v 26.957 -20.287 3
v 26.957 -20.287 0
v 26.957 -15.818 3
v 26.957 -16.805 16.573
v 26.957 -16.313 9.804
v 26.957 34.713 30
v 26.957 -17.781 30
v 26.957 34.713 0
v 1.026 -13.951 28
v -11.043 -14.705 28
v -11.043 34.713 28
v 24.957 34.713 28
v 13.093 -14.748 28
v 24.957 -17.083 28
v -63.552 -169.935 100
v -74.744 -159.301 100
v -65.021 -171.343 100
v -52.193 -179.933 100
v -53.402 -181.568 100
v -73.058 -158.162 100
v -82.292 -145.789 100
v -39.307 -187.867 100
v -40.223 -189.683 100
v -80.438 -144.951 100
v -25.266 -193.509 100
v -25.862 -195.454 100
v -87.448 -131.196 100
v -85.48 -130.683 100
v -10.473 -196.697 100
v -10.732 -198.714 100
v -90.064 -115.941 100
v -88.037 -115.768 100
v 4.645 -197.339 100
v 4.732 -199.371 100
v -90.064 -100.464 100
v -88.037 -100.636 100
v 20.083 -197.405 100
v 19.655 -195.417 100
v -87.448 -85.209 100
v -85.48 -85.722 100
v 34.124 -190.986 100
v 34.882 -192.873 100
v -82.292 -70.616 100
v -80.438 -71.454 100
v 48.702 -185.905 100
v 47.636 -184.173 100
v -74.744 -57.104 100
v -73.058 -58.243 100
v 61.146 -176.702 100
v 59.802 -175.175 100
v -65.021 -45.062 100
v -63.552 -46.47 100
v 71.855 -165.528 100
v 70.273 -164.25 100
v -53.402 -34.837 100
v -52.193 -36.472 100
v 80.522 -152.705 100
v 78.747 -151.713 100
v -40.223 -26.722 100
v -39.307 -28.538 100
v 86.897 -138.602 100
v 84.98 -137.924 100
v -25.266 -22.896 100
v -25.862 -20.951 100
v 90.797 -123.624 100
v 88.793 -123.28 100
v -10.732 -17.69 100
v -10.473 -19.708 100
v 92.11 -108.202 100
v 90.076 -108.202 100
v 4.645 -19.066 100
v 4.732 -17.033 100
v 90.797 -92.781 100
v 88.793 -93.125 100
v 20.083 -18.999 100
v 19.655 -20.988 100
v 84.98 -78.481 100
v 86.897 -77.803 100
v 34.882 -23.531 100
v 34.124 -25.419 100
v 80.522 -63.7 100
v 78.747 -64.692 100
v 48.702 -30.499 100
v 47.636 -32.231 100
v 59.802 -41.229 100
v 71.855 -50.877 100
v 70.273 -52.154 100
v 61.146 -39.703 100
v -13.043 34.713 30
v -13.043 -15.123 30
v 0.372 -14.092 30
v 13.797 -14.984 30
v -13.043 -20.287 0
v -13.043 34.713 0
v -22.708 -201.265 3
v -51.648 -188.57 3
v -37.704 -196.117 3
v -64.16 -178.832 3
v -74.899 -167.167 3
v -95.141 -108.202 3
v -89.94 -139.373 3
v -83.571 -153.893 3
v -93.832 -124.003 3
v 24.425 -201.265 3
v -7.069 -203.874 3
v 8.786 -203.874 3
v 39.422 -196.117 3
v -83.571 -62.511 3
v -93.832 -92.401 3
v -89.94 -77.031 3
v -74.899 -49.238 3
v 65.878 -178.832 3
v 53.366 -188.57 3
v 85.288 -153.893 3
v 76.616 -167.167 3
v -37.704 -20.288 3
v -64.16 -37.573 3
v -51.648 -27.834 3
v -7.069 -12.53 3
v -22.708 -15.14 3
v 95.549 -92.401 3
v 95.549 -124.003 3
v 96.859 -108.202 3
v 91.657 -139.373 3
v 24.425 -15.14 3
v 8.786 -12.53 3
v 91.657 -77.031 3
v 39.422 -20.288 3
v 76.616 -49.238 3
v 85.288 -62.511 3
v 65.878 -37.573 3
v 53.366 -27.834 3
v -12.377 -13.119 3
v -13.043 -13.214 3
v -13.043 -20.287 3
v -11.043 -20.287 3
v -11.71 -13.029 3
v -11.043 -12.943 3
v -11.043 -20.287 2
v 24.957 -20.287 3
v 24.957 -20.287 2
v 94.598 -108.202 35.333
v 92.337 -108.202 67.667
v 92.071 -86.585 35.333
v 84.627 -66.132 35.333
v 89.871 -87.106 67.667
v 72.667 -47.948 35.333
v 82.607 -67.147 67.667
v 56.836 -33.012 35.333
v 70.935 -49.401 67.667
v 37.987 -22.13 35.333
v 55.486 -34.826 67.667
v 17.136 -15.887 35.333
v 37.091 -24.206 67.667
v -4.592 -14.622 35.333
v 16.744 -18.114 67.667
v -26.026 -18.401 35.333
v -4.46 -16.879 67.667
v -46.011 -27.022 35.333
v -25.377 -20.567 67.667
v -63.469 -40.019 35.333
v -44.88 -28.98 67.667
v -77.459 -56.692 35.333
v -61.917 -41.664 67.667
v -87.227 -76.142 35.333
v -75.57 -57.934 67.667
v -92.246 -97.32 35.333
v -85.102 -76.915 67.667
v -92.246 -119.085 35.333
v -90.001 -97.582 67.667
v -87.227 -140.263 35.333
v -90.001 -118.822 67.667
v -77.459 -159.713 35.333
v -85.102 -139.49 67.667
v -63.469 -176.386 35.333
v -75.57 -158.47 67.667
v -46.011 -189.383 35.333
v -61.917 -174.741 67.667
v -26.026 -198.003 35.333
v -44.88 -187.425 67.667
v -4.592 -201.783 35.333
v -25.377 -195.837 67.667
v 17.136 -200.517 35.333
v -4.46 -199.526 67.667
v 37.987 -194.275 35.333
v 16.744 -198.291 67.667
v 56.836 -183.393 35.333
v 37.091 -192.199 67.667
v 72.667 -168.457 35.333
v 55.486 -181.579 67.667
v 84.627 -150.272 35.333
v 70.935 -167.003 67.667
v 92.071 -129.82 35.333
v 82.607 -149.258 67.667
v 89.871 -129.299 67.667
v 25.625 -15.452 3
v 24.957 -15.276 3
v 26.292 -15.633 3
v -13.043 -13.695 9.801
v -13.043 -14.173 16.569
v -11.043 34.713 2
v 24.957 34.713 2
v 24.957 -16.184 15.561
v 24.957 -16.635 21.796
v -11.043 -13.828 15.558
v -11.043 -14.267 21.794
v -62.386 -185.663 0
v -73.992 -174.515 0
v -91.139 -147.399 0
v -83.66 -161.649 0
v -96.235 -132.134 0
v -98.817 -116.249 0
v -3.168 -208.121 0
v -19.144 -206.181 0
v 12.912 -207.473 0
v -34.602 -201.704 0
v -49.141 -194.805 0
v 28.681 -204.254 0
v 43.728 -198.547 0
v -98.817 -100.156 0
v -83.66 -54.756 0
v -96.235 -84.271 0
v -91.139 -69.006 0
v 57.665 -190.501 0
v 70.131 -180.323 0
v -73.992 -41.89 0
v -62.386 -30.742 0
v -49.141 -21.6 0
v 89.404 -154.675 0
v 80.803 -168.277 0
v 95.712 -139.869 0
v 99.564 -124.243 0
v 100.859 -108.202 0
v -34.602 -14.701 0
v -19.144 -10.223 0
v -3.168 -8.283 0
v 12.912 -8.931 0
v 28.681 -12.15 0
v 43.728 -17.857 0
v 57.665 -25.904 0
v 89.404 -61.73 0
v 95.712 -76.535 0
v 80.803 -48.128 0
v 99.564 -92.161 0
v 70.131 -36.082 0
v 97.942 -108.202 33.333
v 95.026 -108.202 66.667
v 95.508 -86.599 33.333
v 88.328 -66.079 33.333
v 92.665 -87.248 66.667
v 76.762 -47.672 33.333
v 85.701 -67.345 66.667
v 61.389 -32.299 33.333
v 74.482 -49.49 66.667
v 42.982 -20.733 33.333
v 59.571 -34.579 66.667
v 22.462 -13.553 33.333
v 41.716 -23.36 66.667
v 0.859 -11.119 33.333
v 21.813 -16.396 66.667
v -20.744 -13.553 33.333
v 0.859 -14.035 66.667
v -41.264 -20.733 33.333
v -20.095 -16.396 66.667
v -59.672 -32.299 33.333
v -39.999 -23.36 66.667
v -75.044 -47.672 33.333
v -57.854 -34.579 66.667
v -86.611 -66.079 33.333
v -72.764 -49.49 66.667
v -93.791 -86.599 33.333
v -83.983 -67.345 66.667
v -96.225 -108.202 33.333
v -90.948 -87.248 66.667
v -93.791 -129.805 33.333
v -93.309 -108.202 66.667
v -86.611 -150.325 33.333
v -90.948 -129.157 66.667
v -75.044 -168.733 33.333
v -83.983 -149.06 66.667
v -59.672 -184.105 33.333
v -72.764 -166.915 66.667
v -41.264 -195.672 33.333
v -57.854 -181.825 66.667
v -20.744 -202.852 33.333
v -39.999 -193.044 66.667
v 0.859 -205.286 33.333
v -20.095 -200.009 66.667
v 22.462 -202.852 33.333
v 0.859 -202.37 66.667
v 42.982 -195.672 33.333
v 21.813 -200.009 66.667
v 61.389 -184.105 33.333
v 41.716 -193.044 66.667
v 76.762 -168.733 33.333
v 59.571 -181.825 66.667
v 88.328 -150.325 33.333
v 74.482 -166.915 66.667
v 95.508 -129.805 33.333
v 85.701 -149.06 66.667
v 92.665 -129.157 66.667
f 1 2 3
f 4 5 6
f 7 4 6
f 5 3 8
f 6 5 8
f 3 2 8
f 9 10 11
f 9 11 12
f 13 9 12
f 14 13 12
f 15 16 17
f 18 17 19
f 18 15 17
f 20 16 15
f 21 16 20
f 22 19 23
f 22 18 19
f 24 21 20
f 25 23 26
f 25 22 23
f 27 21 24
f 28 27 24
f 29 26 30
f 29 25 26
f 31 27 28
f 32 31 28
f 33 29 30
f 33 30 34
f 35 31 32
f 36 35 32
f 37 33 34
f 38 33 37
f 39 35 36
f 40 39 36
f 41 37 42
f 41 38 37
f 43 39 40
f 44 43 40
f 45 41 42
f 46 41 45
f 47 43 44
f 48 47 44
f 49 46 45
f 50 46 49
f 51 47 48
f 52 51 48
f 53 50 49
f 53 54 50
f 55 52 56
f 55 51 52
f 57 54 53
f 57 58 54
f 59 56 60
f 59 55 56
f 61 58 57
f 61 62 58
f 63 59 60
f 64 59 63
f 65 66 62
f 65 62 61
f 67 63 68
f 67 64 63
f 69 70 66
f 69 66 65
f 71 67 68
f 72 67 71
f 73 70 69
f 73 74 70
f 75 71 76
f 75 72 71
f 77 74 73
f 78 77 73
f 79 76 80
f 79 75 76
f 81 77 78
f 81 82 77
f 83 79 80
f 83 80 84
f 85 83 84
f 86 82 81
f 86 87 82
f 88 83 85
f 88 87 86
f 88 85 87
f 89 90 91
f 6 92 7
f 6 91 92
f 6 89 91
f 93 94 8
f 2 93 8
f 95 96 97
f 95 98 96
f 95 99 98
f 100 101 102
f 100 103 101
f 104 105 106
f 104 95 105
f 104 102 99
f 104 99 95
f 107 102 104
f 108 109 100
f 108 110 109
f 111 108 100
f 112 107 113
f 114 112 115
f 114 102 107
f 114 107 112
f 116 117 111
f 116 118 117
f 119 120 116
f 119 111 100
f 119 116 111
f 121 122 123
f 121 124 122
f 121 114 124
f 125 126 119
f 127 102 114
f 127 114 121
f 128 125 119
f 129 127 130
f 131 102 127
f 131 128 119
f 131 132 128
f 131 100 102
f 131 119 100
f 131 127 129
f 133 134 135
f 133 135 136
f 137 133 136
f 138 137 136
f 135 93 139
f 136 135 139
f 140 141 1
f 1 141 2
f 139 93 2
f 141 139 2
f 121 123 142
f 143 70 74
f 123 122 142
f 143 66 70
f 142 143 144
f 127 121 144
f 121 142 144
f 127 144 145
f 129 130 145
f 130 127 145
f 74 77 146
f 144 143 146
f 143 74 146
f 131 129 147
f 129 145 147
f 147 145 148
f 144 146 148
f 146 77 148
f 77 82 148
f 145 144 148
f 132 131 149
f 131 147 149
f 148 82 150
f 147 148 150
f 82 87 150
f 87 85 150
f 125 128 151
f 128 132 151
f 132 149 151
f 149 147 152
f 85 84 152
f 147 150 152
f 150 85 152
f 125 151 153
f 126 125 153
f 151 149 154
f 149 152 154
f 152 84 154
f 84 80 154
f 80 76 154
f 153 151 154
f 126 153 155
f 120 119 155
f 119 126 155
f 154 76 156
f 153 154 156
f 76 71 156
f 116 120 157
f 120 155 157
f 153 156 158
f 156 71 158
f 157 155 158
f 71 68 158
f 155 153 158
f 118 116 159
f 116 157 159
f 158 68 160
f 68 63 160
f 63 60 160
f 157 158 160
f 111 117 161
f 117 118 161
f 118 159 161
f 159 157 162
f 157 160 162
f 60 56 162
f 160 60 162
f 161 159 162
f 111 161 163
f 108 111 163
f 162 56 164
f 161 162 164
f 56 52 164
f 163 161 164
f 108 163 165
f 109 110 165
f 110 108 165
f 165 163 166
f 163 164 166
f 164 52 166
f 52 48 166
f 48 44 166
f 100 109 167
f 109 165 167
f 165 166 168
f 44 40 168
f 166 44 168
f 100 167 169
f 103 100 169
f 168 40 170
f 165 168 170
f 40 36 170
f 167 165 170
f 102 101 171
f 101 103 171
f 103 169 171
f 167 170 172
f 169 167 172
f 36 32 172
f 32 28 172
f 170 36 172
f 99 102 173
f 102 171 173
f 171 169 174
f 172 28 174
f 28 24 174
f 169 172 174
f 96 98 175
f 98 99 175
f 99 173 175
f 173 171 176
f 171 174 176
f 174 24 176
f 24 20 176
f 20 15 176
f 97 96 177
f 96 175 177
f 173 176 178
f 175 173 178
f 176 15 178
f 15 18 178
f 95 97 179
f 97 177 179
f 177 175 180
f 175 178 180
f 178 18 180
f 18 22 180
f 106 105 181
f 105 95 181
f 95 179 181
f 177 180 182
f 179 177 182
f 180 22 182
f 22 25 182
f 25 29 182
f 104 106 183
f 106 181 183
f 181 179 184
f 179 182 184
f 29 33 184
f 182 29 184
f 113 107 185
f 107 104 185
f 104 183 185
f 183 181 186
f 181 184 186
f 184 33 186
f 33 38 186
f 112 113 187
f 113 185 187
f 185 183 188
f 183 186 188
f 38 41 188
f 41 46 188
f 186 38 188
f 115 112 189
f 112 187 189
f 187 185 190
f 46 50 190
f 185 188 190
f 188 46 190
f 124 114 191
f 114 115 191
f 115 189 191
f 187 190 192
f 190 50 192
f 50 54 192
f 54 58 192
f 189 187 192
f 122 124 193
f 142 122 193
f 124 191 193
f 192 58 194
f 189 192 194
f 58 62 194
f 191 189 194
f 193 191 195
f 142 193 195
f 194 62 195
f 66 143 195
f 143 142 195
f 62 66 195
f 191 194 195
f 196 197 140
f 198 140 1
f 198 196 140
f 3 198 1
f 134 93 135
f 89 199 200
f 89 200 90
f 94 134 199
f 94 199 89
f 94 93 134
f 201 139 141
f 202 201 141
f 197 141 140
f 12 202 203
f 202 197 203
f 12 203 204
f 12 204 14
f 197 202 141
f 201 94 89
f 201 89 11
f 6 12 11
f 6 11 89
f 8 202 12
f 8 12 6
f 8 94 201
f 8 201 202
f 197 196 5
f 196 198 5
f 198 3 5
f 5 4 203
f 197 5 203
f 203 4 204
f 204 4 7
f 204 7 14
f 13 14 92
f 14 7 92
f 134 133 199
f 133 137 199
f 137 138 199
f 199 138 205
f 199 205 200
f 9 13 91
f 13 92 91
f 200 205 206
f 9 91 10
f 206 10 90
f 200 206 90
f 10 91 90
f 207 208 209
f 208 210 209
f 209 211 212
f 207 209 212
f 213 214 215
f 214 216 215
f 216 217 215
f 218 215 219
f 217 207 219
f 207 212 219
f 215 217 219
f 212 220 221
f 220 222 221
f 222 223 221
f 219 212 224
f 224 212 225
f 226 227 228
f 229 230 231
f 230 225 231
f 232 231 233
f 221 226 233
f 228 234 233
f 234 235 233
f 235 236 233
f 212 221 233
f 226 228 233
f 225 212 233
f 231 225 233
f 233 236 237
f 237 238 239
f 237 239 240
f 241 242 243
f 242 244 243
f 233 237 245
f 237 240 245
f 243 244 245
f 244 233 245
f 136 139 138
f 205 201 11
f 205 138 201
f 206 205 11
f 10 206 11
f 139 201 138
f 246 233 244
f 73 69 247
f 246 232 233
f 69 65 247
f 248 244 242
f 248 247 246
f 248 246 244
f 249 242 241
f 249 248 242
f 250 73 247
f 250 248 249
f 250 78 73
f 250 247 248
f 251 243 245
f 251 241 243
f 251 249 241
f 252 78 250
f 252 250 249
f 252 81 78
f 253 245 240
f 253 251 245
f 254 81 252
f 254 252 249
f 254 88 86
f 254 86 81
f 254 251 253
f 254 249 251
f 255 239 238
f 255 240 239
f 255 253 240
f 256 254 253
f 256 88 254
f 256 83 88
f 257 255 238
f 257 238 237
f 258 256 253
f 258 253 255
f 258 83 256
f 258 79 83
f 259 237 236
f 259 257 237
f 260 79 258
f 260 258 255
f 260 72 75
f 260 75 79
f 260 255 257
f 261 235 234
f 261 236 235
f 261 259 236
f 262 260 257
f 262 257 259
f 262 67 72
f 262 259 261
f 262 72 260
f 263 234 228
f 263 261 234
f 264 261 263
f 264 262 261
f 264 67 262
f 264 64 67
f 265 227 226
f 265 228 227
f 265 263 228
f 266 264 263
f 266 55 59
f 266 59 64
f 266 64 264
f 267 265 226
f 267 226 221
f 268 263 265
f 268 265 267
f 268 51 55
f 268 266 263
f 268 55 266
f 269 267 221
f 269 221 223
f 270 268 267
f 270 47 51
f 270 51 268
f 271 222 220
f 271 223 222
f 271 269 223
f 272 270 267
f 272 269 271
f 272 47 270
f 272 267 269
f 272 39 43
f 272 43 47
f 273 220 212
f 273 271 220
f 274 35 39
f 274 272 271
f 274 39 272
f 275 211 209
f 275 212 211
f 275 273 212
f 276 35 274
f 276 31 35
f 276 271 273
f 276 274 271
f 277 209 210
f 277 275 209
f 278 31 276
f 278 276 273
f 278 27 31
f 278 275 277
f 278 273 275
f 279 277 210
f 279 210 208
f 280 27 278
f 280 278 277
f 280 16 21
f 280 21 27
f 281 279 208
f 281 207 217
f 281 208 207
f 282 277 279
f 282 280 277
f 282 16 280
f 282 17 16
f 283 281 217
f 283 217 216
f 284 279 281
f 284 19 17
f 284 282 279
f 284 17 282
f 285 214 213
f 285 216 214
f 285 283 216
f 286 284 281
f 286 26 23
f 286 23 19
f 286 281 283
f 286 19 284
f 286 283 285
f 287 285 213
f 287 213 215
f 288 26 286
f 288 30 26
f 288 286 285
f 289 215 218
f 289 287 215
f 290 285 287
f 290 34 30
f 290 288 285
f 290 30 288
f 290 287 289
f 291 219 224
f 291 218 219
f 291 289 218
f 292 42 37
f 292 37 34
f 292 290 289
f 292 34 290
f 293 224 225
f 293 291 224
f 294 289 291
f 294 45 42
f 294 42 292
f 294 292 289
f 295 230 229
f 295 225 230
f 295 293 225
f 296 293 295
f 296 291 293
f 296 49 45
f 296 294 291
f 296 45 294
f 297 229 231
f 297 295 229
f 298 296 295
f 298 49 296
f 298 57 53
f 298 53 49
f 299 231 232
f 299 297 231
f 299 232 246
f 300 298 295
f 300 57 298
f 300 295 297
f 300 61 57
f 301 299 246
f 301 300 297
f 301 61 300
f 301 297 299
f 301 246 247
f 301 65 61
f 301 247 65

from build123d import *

# Parameters (mm, degrees)
F0_W          = 40
F0_H          = 55
F1_DEPTH      = 30
F2_W          = 36
F2_H          = 26
F3_DEPTH      = 189.1
F3_DEPTH_BACK = 48.4
F4_R          = 100
F5_DEPTH      = 100
F5_TAPER      = 5
F8_R          = 96
F9_DEPTH      = 100
F9_TAPER      = 4


with BuildPart() as f1:
    # F0 (on Top) → F1 (new body)
    with BuildSketch(Plane.XY):
        with Locations((6.9573908113, 20.1134101001)):
            Rectangle(F0_W, F0_H)
    extrude(amount=F1_DEPTH)

    # F2 (on face) → F3 (cut, two sides)
    with BuildSketch(Plane.XZ.offset(7.3865898999)) as f3_sk:
        with Locations((6.9573908113, 15)):
            Rectangle(F2_W, F2_H)
    extrude(amount=-F3_DEPTH, mode=Mode.SUBTRACT)
    extrude(f3_sk.sketch, amount=F3_DEPTH_BACK, mode=Mode.SUBTRACT)


with BuildPart() as f5:
    # F4 (on Top) → F5 (new body)
    with BuildSketch(Plane.XY):
        with Locations((0.8587710145, -108.2022971908)):
            Circle(F4_R)
    extrude(amount=F5_DEPTH, taper=F5_TAPER)


with BuildPart() as f1_1:
    # F6: moved
    add(f1.part.moved(Location((0, -12.9, 0))))


with BuildPart() as f9_tool:
    # F8 (on offset) → F9 (new body)
    with BuildSketch(Plane.XY.offset(3)):
        with Locations((0.8587710145, -108.2022971908)):
            Circle(F8_R)
    extrude(amount=F9_DEPTH, taper=F9_TAPER)


with BuildPart() as f1_2:
    add(f1_1.part)

    # F9: cut by f9_tool
    add(f9_tool.part, mode=Mode.SUBTRACT)


with BuildPart() as f5_1:
    add(f5.part)

    # F9: cut by f9_tool
    add(f9_tool.part, mode=Mode.SUBTRACT)


solid = Compound([f1_2.part, f5_1.part])
